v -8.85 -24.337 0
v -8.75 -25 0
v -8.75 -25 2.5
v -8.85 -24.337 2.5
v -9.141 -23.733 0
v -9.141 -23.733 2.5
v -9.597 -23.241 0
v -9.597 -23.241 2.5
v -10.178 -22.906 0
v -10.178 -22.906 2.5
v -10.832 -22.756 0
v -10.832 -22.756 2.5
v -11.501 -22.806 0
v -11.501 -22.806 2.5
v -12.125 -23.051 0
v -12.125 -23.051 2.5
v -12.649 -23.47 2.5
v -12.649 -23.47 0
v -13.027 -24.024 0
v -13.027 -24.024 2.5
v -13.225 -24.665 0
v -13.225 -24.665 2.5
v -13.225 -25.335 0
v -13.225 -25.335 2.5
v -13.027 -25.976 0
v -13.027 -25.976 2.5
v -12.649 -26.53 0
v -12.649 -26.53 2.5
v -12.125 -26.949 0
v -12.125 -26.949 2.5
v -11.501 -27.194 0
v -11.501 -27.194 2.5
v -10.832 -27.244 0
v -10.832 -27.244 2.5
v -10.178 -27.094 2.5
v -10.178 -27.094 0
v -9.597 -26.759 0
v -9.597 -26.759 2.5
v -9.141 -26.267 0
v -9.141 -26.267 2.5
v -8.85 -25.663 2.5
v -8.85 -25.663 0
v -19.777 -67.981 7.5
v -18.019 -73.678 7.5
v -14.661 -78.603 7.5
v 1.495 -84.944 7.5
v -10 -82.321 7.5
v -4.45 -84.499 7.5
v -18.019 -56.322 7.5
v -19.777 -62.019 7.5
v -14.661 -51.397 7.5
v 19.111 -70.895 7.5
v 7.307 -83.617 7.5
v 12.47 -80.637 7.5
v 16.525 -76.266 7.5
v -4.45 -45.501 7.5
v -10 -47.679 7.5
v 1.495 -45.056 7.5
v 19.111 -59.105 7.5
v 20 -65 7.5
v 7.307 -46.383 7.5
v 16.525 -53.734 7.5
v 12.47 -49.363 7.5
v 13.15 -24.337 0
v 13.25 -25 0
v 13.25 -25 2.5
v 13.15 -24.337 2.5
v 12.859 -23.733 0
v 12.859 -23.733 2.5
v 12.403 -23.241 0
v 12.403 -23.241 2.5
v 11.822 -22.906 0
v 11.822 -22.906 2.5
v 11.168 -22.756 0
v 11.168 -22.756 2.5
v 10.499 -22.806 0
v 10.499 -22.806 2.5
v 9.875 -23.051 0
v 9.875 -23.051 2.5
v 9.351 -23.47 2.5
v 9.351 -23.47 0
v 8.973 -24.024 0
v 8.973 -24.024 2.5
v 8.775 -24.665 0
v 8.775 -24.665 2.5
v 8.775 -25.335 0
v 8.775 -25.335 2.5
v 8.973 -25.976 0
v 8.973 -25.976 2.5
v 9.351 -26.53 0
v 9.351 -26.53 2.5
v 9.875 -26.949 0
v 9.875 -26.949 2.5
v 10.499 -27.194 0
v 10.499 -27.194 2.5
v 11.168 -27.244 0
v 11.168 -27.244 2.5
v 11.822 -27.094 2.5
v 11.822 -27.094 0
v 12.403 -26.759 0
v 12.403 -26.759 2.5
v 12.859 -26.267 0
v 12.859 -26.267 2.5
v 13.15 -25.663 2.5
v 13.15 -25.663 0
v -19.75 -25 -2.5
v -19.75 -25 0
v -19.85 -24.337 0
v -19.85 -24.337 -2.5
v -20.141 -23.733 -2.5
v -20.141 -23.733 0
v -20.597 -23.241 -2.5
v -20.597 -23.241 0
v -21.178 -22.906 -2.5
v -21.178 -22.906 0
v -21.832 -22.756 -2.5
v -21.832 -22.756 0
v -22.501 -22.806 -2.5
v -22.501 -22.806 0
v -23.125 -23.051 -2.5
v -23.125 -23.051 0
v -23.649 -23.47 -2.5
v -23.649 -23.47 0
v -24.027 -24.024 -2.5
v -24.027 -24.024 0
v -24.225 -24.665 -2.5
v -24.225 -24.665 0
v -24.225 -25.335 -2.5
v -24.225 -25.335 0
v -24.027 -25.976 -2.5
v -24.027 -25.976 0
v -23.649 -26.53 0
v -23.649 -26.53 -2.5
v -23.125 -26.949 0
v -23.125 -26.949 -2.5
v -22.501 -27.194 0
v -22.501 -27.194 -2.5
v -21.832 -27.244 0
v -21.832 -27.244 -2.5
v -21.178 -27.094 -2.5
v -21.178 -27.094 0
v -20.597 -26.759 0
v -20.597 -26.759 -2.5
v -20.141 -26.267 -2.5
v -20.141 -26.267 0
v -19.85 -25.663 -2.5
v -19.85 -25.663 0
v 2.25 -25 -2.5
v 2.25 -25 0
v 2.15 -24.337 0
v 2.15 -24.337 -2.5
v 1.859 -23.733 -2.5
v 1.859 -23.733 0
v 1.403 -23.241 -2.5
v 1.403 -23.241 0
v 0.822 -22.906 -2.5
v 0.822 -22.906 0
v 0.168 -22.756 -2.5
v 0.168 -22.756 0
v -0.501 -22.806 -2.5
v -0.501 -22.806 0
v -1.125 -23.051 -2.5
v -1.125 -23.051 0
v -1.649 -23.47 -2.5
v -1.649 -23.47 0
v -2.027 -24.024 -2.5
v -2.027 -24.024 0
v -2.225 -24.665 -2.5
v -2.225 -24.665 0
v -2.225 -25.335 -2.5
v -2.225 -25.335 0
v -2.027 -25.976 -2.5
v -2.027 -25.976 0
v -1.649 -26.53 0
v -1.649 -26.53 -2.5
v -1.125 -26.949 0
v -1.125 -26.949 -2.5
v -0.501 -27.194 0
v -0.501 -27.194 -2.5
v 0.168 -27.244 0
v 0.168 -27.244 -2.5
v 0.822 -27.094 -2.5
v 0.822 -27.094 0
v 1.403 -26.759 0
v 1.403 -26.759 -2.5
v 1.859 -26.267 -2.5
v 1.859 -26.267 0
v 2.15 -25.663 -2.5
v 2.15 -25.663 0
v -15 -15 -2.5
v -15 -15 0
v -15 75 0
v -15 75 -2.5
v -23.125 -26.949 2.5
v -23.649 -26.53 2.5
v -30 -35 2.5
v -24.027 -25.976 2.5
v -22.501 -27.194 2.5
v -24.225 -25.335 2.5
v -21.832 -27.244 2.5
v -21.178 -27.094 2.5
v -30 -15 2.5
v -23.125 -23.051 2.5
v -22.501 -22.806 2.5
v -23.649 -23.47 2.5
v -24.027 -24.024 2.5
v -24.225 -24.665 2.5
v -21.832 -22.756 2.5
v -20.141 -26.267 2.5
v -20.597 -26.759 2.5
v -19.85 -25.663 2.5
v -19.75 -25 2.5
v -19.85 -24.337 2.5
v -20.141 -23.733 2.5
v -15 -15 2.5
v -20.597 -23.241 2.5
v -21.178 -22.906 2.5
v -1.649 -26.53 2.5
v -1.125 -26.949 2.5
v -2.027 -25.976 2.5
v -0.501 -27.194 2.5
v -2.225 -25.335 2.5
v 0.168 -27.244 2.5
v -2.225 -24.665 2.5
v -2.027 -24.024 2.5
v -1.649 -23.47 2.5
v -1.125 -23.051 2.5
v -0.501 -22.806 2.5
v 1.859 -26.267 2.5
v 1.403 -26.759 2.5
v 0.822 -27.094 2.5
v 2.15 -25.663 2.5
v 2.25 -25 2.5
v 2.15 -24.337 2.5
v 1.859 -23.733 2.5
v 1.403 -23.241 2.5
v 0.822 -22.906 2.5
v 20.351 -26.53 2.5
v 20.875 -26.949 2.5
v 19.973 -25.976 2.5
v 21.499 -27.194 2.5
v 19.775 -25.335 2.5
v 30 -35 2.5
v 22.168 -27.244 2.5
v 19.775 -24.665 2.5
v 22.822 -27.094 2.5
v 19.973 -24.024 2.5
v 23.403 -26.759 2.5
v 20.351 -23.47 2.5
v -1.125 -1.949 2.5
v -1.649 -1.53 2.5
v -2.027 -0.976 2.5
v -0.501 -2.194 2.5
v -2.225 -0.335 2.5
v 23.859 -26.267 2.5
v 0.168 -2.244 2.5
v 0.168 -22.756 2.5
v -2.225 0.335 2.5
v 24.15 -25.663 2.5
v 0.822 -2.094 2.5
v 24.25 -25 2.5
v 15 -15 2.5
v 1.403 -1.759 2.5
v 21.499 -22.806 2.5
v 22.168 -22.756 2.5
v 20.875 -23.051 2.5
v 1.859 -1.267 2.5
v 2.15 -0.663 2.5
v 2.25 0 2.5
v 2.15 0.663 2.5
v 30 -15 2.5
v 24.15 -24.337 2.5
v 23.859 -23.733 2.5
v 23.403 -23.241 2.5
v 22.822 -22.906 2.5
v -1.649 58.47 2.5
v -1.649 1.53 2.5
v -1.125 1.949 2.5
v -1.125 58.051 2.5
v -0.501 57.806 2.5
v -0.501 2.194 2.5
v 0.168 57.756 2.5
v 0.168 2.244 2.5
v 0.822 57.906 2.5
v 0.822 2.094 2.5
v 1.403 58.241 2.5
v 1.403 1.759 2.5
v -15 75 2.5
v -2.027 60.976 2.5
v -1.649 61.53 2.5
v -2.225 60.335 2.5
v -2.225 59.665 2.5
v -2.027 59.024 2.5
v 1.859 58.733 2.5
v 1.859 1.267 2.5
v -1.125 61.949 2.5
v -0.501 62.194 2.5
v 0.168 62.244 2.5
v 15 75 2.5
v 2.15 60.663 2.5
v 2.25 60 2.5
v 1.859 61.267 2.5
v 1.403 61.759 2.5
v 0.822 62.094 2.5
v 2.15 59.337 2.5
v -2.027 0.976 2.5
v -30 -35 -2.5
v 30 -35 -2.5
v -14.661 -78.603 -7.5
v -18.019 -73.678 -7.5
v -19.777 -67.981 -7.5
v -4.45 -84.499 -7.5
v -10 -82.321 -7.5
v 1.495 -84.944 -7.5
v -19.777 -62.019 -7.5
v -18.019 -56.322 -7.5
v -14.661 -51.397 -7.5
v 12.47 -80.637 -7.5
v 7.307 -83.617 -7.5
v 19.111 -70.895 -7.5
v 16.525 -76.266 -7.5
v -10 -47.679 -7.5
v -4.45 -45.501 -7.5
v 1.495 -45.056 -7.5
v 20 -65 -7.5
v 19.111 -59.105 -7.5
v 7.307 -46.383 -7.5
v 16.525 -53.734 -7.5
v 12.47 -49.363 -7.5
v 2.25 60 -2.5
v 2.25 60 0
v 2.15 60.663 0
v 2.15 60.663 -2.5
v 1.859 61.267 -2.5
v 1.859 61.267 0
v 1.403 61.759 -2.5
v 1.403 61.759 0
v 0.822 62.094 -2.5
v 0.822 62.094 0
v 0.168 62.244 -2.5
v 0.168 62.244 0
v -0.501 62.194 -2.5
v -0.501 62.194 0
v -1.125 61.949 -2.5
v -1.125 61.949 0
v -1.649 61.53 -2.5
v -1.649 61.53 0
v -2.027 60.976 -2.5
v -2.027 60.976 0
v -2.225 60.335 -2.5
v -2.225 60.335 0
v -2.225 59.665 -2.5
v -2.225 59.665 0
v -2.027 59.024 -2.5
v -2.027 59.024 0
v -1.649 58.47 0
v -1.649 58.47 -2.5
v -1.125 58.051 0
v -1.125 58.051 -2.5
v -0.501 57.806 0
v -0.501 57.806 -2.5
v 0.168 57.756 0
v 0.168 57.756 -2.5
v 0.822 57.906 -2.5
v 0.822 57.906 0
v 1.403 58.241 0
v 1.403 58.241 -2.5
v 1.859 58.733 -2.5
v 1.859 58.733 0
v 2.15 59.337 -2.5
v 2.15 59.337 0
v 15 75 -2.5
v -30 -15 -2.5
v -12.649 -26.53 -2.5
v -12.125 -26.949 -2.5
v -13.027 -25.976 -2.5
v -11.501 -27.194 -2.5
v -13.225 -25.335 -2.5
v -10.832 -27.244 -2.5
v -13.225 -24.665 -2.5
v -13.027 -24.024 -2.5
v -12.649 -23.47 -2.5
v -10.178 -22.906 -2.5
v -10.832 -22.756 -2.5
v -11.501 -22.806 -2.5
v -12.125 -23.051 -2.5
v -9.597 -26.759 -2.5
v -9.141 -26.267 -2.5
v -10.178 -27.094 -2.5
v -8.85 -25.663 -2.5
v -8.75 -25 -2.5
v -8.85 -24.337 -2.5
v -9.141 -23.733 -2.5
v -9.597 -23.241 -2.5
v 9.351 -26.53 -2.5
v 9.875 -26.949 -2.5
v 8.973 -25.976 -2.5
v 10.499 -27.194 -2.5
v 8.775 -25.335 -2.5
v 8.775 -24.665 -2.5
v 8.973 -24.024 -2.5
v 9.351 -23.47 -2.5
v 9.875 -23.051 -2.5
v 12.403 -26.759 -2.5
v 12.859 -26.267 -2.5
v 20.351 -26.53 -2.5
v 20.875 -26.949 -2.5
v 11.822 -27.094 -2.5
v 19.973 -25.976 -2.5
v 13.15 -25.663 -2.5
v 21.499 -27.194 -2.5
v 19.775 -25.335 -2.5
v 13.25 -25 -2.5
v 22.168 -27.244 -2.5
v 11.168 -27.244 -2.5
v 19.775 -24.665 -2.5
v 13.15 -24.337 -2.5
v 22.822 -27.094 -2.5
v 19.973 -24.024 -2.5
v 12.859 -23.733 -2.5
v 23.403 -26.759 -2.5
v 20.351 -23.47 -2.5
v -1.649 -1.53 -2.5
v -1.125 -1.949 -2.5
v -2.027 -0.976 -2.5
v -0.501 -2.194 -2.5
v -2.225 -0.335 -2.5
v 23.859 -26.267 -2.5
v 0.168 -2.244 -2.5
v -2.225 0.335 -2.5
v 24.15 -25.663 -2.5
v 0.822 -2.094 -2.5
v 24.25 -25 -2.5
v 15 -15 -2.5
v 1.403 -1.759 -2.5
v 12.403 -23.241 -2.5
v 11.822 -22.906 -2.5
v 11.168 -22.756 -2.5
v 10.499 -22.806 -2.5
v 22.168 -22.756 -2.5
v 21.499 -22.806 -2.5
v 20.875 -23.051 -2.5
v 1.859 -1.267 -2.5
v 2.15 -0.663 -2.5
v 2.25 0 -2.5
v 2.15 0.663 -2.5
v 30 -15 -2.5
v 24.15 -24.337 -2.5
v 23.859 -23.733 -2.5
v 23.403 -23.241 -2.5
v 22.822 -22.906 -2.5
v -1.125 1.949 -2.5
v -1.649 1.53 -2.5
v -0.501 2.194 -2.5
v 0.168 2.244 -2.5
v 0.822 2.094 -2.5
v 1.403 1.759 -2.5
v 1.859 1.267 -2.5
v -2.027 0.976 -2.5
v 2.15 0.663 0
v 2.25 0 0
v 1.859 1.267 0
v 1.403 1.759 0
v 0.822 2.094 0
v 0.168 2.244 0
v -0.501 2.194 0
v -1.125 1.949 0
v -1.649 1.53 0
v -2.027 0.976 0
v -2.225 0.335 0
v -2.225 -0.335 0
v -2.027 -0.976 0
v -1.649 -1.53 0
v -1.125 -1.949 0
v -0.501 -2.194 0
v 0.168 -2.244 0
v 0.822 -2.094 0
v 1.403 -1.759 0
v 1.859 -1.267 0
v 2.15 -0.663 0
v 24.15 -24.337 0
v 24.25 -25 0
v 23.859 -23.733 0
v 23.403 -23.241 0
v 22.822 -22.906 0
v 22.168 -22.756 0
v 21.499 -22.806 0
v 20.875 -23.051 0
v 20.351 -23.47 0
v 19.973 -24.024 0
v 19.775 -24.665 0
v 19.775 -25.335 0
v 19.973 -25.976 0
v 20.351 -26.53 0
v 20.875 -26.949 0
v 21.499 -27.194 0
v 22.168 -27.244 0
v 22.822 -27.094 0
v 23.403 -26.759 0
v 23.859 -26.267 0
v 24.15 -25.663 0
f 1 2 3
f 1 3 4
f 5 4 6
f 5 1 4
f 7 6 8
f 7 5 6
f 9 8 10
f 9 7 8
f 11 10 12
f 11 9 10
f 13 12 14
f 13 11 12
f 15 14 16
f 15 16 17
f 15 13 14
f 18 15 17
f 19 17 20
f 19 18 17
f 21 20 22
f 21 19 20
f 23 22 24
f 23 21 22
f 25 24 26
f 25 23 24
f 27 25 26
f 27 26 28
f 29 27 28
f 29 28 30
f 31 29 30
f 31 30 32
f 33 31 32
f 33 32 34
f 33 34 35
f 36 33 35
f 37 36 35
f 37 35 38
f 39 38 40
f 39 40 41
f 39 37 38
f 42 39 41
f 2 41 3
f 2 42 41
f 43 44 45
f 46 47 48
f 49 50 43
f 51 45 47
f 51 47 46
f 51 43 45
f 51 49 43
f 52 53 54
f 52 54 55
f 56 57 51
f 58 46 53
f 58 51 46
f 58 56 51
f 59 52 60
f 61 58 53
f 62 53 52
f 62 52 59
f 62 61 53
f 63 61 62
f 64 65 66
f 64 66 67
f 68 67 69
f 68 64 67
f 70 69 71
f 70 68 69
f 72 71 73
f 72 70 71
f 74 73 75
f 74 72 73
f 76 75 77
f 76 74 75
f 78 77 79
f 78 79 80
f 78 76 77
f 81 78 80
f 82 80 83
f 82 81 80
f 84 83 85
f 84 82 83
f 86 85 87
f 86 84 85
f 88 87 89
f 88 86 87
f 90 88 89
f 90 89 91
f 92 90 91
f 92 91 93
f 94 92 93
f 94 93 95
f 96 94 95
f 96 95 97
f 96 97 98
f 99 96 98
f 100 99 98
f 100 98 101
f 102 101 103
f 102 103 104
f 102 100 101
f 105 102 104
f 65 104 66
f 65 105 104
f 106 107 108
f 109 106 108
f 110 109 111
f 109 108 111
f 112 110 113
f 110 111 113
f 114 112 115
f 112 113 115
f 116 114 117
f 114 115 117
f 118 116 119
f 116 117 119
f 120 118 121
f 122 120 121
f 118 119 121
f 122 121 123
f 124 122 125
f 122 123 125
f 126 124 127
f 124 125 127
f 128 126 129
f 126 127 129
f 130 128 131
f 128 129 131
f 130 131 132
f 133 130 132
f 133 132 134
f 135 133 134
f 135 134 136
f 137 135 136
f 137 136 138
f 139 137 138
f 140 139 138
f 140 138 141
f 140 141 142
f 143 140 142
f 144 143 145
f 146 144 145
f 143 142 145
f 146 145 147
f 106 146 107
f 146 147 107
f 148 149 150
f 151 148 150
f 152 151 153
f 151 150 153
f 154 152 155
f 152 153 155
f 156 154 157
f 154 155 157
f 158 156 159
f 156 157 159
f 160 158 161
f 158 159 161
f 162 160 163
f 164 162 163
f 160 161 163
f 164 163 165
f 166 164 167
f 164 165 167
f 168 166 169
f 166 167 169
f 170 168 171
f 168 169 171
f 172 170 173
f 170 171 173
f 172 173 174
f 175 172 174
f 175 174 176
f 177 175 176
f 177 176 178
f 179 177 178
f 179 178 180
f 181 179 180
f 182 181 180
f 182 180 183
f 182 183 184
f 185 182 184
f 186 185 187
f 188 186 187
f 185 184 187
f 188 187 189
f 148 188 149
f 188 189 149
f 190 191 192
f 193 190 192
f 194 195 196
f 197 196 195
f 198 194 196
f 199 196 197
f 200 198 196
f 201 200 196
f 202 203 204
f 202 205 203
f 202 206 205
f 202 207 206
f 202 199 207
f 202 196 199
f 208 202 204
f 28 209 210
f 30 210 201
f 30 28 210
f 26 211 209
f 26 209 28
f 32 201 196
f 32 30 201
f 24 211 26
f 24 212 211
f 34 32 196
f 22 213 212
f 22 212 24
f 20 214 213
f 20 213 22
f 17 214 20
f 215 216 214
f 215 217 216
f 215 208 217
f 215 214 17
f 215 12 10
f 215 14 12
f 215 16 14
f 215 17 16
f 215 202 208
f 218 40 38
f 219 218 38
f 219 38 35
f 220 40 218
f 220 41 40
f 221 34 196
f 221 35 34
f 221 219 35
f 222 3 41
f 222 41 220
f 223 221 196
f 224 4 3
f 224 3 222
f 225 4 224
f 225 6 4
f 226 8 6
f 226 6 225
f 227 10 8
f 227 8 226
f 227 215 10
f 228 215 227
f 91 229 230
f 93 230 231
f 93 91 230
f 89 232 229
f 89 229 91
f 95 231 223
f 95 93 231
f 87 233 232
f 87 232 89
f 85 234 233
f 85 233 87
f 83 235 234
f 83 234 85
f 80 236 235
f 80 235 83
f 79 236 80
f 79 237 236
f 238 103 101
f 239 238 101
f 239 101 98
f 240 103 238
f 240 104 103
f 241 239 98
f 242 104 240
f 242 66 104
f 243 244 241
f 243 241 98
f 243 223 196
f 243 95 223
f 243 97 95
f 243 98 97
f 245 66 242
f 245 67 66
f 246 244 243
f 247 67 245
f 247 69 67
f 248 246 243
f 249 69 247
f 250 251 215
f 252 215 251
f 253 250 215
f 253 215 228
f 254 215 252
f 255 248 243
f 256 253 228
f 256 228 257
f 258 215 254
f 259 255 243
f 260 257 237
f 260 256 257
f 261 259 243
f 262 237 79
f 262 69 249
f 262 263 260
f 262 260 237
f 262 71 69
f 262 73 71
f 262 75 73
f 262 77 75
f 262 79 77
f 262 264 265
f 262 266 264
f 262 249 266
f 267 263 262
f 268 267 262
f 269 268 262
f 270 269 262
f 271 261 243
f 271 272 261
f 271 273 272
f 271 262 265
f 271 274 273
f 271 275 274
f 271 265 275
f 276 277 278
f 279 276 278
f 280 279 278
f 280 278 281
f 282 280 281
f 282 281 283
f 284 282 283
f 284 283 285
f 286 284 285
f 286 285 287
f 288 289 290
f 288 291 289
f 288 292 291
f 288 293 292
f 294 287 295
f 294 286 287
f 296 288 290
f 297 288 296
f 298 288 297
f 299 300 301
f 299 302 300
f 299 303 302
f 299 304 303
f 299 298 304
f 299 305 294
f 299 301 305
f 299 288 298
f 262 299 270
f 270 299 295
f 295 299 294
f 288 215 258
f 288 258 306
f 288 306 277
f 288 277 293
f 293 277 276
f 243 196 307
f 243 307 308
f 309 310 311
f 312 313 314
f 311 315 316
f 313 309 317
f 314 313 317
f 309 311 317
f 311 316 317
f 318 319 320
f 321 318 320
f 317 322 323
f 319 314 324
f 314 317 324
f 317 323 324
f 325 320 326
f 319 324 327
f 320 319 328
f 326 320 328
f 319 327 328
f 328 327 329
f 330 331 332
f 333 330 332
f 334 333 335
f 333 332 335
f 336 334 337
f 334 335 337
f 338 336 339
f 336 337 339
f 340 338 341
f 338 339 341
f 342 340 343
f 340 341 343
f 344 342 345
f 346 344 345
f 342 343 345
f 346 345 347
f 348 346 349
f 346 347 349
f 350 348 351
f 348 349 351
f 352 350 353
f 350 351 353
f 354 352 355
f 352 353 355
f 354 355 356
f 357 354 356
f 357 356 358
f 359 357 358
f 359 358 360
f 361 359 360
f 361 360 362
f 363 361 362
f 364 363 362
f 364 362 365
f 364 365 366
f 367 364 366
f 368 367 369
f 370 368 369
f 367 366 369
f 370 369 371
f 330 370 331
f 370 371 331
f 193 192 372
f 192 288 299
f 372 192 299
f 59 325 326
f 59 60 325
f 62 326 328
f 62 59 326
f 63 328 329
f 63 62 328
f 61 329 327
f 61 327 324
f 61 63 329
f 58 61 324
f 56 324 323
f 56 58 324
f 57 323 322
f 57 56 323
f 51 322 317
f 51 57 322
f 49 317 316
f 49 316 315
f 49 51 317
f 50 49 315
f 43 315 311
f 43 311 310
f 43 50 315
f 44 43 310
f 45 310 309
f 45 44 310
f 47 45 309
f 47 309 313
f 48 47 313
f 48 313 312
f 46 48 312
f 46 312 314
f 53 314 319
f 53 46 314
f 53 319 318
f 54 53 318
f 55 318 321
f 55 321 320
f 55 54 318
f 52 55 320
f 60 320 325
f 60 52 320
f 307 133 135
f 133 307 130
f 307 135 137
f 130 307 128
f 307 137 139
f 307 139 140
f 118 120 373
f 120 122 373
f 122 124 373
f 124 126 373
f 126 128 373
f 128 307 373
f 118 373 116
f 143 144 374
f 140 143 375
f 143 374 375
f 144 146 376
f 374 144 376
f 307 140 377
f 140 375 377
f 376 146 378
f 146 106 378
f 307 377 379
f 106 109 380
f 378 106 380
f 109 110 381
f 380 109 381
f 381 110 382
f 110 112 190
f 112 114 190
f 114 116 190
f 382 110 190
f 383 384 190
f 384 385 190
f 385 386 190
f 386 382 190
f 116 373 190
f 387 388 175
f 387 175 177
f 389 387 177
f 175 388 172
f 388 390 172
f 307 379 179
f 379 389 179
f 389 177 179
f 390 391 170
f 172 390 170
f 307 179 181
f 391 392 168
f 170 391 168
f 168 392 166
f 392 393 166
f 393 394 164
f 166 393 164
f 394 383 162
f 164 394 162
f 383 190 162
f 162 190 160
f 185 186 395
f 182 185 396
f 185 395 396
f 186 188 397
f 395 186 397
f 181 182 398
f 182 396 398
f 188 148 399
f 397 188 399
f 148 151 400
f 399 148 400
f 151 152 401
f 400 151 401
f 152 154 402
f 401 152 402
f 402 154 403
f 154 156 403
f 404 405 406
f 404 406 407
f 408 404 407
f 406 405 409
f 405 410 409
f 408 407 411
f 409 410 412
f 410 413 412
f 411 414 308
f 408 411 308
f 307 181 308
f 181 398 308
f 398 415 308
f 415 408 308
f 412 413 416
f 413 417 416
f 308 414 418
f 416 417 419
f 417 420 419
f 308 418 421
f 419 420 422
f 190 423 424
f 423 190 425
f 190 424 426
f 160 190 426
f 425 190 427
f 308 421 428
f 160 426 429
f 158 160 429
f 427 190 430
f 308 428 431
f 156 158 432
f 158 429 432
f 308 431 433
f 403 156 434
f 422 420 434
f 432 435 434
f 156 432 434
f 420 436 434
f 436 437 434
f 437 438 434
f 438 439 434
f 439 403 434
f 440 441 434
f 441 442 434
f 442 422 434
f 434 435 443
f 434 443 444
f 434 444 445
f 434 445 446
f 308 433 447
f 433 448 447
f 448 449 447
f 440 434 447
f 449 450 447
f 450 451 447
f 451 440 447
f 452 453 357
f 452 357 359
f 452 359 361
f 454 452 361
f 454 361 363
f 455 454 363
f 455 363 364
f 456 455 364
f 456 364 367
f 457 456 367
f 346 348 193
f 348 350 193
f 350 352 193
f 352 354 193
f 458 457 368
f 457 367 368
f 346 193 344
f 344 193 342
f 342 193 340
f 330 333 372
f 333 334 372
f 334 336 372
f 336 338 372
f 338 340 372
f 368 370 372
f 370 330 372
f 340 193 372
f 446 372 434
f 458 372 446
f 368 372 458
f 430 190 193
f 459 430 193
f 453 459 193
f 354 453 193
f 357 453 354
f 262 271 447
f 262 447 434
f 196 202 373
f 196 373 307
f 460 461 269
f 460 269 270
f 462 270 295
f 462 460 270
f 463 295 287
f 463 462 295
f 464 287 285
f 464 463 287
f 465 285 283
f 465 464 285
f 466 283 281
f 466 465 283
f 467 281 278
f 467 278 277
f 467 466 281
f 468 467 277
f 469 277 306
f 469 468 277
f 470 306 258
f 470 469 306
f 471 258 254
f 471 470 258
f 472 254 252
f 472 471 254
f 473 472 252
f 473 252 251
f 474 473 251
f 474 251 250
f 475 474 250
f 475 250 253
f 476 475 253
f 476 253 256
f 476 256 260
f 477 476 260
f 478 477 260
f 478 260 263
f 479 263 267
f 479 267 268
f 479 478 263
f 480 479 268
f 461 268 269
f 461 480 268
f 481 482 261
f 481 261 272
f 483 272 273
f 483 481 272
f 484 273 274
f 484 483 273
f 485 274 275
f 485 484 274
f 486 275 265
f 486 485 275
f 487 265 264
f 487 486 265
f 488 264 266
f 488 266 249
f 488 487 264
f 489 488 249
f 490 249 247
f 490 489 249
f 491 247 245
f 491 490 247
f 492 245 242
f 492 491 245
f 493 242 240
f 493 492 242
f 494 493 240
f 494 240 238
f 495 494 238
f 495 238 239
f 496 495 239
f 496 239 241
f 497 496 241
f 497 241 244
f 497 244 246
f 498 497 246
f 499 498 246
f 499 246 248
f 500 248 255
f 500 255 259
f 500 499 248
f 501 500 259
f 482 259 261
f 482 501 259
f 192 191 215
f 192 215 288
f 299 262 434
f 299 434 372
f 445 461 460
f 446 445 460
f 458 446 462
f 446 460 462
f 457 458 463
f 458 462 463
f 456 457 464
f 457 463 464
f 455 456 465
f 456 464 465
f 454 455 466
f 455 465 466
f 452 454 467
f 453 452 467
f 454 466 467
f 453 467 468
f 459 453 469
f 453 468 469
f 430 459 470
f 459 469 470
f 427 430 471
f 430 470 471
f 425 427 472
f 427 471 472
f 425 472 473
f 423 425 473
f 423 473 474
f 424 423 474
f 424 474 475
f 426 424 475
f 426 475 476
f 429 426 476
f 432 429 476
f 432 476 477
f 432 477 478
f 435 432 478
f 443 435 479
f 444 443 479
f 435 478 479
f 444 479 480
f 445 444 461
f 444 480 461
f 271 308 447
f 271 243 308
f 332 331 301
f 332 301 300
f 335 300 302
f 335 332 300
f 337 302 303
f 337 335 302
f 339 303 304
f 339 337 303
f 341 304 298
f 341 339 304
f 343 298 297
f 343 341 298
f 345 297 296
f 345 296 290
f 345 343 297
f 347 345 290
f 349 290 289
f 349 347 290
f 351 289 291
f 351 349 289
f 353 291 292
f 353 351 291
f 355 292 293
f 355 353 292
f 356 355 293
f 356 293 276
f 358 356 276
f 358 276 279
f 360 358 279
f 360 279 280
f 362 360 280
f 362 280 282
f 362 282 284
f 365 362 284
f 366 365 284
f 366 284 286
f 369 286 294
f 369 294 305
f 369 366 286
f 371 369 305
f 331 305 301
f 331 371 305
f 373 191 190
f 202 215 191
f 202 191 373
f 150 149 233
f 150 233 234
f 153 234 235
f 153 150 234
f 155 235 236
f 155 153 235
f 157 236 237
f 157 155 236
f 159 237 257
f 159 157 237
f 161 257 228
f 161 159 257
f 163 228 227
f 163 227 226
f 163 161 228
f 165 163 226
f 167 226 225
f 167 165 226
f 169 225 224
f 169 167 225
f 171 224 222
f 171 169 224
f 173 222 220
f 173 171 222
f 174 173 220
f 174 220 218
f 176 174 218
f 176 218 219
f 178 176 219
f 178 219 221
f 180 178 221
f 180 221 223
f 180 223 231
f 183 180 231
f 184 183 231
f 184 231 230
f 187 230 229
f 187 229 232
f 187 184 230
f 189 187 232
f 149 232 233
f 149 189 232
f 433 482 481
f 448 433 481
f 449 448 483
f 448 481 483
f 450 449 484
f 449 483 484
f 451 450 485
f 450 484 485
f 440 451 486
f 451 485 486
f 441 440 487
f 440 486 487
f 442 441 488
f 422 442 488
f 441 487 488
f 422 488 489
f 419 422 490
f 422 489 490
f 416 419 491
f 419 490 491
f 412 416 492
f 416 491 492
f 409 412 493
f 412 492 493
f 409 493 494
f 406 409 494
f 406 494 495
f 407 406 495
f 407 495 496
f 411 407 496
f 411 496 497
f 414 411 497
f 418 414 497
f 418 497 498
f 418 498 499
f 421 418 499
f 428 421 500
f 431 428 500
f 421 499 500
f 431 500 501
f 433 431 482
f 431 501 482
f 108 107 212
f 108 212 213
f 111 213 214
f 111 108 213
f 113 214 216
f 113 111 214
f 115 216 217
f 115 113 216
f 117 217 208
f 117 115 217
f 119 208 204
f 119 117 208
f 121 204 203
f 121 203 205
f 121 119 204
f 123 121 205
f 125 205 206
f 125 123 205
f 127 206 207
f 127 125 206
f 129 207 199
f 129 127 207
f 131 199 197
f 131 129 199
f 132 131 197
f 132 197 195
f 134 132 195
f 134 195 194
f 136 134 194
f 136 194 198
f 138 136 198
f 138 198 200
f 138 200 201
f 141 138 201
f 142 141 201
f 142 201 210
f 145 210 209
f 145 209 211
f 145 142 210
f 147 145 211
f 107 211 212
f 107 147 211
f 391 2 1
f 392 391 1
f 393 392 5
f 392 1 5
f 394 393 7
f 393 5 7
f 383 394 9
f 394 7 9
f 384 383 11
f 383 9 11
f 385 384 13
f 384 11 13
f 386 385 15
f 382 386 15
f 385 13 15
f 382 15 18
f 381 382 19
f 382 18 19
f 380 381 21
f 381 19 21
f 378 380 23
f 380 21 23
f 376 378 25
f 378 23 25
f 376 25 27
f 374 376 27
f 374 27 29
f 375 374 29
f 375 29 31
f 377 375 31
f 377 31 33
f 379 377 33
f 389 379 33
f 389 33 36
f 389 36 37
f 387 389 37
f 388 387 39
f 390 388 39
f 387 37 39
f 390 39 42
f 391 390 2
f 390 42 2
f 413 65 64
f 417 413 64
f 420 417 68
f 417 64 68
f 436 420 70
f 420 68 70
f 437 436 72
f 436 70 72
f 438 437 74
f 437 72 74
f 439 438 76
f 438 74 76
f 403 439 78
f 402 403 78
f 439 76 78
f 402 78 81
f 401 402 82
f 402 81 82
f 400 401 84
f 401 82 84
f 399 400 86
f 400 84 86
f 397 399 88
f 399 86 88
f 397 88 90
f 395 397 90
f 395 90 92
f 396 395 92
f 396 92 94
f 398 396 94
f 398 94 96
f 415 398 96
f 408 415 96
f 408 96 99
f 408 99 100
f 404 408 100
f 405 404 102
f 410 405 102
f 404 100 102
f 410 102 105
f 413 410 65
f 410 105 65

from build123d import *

# Parameters (mm, degrees)
SKETCH1_R           = 2.25
BOSS_EXTRUDE1_DEPTH = 2.5
SKETCH1_3_R         = 20
BOSS_EXTRUDE2_DEPTH = 7.5


with BuildPart() as part:
    # Sketch1 → Boss-Extrude1 (new, symmetric)
    with BuildSketch(Plane.XY):
        Polygon((30, -15), (15, -15), (15, 75), (-15, 75), (-15, -15), (-30, -15), (-30, -35), (30, -35), align=None)
        with Locations((-22, -25)):
            Circle(SKETCH1_R, mode=Mode.SUBTRACT)
        with Locations((-11, -25)):
            Circle(SKETCH1_R, mode=Mode.SUBTRACT)
        with Locations((0, -25)):
            Circle(SKETCH1_R, mode=Mode.SUBTRACT)
        with Locations((11, -25)):
            Circle(SKETCH1_R, mode=Mode.SUBTRACT)
        with Locations((22, -25)):
            Circle(SKETCH1_R, mode=Mode.SUBTRACT)
        with Locations((0, 60)):
            Circle(SKETCH1_R, mode=Mode.SUBTRACT)
        Circle(SKETCH1_R, mode=Mode.SUBTRACT)
    extrude(amount=BOSS_EXTRUDE1_DEPTH, both=True)


with BuildPart() as body_2:
    # Sketch1<3> → Boss-Extrude2 (new, symmetric)
    with BuildSketch(Plane.XY):
        with Locations((0, -65)):
            Circle(SKETCH1_3_R)
    extrude(amount=BOSS_EXTRUDE2_DEPTH, both=True)


solid = Compound([part.part, body_2.part])
